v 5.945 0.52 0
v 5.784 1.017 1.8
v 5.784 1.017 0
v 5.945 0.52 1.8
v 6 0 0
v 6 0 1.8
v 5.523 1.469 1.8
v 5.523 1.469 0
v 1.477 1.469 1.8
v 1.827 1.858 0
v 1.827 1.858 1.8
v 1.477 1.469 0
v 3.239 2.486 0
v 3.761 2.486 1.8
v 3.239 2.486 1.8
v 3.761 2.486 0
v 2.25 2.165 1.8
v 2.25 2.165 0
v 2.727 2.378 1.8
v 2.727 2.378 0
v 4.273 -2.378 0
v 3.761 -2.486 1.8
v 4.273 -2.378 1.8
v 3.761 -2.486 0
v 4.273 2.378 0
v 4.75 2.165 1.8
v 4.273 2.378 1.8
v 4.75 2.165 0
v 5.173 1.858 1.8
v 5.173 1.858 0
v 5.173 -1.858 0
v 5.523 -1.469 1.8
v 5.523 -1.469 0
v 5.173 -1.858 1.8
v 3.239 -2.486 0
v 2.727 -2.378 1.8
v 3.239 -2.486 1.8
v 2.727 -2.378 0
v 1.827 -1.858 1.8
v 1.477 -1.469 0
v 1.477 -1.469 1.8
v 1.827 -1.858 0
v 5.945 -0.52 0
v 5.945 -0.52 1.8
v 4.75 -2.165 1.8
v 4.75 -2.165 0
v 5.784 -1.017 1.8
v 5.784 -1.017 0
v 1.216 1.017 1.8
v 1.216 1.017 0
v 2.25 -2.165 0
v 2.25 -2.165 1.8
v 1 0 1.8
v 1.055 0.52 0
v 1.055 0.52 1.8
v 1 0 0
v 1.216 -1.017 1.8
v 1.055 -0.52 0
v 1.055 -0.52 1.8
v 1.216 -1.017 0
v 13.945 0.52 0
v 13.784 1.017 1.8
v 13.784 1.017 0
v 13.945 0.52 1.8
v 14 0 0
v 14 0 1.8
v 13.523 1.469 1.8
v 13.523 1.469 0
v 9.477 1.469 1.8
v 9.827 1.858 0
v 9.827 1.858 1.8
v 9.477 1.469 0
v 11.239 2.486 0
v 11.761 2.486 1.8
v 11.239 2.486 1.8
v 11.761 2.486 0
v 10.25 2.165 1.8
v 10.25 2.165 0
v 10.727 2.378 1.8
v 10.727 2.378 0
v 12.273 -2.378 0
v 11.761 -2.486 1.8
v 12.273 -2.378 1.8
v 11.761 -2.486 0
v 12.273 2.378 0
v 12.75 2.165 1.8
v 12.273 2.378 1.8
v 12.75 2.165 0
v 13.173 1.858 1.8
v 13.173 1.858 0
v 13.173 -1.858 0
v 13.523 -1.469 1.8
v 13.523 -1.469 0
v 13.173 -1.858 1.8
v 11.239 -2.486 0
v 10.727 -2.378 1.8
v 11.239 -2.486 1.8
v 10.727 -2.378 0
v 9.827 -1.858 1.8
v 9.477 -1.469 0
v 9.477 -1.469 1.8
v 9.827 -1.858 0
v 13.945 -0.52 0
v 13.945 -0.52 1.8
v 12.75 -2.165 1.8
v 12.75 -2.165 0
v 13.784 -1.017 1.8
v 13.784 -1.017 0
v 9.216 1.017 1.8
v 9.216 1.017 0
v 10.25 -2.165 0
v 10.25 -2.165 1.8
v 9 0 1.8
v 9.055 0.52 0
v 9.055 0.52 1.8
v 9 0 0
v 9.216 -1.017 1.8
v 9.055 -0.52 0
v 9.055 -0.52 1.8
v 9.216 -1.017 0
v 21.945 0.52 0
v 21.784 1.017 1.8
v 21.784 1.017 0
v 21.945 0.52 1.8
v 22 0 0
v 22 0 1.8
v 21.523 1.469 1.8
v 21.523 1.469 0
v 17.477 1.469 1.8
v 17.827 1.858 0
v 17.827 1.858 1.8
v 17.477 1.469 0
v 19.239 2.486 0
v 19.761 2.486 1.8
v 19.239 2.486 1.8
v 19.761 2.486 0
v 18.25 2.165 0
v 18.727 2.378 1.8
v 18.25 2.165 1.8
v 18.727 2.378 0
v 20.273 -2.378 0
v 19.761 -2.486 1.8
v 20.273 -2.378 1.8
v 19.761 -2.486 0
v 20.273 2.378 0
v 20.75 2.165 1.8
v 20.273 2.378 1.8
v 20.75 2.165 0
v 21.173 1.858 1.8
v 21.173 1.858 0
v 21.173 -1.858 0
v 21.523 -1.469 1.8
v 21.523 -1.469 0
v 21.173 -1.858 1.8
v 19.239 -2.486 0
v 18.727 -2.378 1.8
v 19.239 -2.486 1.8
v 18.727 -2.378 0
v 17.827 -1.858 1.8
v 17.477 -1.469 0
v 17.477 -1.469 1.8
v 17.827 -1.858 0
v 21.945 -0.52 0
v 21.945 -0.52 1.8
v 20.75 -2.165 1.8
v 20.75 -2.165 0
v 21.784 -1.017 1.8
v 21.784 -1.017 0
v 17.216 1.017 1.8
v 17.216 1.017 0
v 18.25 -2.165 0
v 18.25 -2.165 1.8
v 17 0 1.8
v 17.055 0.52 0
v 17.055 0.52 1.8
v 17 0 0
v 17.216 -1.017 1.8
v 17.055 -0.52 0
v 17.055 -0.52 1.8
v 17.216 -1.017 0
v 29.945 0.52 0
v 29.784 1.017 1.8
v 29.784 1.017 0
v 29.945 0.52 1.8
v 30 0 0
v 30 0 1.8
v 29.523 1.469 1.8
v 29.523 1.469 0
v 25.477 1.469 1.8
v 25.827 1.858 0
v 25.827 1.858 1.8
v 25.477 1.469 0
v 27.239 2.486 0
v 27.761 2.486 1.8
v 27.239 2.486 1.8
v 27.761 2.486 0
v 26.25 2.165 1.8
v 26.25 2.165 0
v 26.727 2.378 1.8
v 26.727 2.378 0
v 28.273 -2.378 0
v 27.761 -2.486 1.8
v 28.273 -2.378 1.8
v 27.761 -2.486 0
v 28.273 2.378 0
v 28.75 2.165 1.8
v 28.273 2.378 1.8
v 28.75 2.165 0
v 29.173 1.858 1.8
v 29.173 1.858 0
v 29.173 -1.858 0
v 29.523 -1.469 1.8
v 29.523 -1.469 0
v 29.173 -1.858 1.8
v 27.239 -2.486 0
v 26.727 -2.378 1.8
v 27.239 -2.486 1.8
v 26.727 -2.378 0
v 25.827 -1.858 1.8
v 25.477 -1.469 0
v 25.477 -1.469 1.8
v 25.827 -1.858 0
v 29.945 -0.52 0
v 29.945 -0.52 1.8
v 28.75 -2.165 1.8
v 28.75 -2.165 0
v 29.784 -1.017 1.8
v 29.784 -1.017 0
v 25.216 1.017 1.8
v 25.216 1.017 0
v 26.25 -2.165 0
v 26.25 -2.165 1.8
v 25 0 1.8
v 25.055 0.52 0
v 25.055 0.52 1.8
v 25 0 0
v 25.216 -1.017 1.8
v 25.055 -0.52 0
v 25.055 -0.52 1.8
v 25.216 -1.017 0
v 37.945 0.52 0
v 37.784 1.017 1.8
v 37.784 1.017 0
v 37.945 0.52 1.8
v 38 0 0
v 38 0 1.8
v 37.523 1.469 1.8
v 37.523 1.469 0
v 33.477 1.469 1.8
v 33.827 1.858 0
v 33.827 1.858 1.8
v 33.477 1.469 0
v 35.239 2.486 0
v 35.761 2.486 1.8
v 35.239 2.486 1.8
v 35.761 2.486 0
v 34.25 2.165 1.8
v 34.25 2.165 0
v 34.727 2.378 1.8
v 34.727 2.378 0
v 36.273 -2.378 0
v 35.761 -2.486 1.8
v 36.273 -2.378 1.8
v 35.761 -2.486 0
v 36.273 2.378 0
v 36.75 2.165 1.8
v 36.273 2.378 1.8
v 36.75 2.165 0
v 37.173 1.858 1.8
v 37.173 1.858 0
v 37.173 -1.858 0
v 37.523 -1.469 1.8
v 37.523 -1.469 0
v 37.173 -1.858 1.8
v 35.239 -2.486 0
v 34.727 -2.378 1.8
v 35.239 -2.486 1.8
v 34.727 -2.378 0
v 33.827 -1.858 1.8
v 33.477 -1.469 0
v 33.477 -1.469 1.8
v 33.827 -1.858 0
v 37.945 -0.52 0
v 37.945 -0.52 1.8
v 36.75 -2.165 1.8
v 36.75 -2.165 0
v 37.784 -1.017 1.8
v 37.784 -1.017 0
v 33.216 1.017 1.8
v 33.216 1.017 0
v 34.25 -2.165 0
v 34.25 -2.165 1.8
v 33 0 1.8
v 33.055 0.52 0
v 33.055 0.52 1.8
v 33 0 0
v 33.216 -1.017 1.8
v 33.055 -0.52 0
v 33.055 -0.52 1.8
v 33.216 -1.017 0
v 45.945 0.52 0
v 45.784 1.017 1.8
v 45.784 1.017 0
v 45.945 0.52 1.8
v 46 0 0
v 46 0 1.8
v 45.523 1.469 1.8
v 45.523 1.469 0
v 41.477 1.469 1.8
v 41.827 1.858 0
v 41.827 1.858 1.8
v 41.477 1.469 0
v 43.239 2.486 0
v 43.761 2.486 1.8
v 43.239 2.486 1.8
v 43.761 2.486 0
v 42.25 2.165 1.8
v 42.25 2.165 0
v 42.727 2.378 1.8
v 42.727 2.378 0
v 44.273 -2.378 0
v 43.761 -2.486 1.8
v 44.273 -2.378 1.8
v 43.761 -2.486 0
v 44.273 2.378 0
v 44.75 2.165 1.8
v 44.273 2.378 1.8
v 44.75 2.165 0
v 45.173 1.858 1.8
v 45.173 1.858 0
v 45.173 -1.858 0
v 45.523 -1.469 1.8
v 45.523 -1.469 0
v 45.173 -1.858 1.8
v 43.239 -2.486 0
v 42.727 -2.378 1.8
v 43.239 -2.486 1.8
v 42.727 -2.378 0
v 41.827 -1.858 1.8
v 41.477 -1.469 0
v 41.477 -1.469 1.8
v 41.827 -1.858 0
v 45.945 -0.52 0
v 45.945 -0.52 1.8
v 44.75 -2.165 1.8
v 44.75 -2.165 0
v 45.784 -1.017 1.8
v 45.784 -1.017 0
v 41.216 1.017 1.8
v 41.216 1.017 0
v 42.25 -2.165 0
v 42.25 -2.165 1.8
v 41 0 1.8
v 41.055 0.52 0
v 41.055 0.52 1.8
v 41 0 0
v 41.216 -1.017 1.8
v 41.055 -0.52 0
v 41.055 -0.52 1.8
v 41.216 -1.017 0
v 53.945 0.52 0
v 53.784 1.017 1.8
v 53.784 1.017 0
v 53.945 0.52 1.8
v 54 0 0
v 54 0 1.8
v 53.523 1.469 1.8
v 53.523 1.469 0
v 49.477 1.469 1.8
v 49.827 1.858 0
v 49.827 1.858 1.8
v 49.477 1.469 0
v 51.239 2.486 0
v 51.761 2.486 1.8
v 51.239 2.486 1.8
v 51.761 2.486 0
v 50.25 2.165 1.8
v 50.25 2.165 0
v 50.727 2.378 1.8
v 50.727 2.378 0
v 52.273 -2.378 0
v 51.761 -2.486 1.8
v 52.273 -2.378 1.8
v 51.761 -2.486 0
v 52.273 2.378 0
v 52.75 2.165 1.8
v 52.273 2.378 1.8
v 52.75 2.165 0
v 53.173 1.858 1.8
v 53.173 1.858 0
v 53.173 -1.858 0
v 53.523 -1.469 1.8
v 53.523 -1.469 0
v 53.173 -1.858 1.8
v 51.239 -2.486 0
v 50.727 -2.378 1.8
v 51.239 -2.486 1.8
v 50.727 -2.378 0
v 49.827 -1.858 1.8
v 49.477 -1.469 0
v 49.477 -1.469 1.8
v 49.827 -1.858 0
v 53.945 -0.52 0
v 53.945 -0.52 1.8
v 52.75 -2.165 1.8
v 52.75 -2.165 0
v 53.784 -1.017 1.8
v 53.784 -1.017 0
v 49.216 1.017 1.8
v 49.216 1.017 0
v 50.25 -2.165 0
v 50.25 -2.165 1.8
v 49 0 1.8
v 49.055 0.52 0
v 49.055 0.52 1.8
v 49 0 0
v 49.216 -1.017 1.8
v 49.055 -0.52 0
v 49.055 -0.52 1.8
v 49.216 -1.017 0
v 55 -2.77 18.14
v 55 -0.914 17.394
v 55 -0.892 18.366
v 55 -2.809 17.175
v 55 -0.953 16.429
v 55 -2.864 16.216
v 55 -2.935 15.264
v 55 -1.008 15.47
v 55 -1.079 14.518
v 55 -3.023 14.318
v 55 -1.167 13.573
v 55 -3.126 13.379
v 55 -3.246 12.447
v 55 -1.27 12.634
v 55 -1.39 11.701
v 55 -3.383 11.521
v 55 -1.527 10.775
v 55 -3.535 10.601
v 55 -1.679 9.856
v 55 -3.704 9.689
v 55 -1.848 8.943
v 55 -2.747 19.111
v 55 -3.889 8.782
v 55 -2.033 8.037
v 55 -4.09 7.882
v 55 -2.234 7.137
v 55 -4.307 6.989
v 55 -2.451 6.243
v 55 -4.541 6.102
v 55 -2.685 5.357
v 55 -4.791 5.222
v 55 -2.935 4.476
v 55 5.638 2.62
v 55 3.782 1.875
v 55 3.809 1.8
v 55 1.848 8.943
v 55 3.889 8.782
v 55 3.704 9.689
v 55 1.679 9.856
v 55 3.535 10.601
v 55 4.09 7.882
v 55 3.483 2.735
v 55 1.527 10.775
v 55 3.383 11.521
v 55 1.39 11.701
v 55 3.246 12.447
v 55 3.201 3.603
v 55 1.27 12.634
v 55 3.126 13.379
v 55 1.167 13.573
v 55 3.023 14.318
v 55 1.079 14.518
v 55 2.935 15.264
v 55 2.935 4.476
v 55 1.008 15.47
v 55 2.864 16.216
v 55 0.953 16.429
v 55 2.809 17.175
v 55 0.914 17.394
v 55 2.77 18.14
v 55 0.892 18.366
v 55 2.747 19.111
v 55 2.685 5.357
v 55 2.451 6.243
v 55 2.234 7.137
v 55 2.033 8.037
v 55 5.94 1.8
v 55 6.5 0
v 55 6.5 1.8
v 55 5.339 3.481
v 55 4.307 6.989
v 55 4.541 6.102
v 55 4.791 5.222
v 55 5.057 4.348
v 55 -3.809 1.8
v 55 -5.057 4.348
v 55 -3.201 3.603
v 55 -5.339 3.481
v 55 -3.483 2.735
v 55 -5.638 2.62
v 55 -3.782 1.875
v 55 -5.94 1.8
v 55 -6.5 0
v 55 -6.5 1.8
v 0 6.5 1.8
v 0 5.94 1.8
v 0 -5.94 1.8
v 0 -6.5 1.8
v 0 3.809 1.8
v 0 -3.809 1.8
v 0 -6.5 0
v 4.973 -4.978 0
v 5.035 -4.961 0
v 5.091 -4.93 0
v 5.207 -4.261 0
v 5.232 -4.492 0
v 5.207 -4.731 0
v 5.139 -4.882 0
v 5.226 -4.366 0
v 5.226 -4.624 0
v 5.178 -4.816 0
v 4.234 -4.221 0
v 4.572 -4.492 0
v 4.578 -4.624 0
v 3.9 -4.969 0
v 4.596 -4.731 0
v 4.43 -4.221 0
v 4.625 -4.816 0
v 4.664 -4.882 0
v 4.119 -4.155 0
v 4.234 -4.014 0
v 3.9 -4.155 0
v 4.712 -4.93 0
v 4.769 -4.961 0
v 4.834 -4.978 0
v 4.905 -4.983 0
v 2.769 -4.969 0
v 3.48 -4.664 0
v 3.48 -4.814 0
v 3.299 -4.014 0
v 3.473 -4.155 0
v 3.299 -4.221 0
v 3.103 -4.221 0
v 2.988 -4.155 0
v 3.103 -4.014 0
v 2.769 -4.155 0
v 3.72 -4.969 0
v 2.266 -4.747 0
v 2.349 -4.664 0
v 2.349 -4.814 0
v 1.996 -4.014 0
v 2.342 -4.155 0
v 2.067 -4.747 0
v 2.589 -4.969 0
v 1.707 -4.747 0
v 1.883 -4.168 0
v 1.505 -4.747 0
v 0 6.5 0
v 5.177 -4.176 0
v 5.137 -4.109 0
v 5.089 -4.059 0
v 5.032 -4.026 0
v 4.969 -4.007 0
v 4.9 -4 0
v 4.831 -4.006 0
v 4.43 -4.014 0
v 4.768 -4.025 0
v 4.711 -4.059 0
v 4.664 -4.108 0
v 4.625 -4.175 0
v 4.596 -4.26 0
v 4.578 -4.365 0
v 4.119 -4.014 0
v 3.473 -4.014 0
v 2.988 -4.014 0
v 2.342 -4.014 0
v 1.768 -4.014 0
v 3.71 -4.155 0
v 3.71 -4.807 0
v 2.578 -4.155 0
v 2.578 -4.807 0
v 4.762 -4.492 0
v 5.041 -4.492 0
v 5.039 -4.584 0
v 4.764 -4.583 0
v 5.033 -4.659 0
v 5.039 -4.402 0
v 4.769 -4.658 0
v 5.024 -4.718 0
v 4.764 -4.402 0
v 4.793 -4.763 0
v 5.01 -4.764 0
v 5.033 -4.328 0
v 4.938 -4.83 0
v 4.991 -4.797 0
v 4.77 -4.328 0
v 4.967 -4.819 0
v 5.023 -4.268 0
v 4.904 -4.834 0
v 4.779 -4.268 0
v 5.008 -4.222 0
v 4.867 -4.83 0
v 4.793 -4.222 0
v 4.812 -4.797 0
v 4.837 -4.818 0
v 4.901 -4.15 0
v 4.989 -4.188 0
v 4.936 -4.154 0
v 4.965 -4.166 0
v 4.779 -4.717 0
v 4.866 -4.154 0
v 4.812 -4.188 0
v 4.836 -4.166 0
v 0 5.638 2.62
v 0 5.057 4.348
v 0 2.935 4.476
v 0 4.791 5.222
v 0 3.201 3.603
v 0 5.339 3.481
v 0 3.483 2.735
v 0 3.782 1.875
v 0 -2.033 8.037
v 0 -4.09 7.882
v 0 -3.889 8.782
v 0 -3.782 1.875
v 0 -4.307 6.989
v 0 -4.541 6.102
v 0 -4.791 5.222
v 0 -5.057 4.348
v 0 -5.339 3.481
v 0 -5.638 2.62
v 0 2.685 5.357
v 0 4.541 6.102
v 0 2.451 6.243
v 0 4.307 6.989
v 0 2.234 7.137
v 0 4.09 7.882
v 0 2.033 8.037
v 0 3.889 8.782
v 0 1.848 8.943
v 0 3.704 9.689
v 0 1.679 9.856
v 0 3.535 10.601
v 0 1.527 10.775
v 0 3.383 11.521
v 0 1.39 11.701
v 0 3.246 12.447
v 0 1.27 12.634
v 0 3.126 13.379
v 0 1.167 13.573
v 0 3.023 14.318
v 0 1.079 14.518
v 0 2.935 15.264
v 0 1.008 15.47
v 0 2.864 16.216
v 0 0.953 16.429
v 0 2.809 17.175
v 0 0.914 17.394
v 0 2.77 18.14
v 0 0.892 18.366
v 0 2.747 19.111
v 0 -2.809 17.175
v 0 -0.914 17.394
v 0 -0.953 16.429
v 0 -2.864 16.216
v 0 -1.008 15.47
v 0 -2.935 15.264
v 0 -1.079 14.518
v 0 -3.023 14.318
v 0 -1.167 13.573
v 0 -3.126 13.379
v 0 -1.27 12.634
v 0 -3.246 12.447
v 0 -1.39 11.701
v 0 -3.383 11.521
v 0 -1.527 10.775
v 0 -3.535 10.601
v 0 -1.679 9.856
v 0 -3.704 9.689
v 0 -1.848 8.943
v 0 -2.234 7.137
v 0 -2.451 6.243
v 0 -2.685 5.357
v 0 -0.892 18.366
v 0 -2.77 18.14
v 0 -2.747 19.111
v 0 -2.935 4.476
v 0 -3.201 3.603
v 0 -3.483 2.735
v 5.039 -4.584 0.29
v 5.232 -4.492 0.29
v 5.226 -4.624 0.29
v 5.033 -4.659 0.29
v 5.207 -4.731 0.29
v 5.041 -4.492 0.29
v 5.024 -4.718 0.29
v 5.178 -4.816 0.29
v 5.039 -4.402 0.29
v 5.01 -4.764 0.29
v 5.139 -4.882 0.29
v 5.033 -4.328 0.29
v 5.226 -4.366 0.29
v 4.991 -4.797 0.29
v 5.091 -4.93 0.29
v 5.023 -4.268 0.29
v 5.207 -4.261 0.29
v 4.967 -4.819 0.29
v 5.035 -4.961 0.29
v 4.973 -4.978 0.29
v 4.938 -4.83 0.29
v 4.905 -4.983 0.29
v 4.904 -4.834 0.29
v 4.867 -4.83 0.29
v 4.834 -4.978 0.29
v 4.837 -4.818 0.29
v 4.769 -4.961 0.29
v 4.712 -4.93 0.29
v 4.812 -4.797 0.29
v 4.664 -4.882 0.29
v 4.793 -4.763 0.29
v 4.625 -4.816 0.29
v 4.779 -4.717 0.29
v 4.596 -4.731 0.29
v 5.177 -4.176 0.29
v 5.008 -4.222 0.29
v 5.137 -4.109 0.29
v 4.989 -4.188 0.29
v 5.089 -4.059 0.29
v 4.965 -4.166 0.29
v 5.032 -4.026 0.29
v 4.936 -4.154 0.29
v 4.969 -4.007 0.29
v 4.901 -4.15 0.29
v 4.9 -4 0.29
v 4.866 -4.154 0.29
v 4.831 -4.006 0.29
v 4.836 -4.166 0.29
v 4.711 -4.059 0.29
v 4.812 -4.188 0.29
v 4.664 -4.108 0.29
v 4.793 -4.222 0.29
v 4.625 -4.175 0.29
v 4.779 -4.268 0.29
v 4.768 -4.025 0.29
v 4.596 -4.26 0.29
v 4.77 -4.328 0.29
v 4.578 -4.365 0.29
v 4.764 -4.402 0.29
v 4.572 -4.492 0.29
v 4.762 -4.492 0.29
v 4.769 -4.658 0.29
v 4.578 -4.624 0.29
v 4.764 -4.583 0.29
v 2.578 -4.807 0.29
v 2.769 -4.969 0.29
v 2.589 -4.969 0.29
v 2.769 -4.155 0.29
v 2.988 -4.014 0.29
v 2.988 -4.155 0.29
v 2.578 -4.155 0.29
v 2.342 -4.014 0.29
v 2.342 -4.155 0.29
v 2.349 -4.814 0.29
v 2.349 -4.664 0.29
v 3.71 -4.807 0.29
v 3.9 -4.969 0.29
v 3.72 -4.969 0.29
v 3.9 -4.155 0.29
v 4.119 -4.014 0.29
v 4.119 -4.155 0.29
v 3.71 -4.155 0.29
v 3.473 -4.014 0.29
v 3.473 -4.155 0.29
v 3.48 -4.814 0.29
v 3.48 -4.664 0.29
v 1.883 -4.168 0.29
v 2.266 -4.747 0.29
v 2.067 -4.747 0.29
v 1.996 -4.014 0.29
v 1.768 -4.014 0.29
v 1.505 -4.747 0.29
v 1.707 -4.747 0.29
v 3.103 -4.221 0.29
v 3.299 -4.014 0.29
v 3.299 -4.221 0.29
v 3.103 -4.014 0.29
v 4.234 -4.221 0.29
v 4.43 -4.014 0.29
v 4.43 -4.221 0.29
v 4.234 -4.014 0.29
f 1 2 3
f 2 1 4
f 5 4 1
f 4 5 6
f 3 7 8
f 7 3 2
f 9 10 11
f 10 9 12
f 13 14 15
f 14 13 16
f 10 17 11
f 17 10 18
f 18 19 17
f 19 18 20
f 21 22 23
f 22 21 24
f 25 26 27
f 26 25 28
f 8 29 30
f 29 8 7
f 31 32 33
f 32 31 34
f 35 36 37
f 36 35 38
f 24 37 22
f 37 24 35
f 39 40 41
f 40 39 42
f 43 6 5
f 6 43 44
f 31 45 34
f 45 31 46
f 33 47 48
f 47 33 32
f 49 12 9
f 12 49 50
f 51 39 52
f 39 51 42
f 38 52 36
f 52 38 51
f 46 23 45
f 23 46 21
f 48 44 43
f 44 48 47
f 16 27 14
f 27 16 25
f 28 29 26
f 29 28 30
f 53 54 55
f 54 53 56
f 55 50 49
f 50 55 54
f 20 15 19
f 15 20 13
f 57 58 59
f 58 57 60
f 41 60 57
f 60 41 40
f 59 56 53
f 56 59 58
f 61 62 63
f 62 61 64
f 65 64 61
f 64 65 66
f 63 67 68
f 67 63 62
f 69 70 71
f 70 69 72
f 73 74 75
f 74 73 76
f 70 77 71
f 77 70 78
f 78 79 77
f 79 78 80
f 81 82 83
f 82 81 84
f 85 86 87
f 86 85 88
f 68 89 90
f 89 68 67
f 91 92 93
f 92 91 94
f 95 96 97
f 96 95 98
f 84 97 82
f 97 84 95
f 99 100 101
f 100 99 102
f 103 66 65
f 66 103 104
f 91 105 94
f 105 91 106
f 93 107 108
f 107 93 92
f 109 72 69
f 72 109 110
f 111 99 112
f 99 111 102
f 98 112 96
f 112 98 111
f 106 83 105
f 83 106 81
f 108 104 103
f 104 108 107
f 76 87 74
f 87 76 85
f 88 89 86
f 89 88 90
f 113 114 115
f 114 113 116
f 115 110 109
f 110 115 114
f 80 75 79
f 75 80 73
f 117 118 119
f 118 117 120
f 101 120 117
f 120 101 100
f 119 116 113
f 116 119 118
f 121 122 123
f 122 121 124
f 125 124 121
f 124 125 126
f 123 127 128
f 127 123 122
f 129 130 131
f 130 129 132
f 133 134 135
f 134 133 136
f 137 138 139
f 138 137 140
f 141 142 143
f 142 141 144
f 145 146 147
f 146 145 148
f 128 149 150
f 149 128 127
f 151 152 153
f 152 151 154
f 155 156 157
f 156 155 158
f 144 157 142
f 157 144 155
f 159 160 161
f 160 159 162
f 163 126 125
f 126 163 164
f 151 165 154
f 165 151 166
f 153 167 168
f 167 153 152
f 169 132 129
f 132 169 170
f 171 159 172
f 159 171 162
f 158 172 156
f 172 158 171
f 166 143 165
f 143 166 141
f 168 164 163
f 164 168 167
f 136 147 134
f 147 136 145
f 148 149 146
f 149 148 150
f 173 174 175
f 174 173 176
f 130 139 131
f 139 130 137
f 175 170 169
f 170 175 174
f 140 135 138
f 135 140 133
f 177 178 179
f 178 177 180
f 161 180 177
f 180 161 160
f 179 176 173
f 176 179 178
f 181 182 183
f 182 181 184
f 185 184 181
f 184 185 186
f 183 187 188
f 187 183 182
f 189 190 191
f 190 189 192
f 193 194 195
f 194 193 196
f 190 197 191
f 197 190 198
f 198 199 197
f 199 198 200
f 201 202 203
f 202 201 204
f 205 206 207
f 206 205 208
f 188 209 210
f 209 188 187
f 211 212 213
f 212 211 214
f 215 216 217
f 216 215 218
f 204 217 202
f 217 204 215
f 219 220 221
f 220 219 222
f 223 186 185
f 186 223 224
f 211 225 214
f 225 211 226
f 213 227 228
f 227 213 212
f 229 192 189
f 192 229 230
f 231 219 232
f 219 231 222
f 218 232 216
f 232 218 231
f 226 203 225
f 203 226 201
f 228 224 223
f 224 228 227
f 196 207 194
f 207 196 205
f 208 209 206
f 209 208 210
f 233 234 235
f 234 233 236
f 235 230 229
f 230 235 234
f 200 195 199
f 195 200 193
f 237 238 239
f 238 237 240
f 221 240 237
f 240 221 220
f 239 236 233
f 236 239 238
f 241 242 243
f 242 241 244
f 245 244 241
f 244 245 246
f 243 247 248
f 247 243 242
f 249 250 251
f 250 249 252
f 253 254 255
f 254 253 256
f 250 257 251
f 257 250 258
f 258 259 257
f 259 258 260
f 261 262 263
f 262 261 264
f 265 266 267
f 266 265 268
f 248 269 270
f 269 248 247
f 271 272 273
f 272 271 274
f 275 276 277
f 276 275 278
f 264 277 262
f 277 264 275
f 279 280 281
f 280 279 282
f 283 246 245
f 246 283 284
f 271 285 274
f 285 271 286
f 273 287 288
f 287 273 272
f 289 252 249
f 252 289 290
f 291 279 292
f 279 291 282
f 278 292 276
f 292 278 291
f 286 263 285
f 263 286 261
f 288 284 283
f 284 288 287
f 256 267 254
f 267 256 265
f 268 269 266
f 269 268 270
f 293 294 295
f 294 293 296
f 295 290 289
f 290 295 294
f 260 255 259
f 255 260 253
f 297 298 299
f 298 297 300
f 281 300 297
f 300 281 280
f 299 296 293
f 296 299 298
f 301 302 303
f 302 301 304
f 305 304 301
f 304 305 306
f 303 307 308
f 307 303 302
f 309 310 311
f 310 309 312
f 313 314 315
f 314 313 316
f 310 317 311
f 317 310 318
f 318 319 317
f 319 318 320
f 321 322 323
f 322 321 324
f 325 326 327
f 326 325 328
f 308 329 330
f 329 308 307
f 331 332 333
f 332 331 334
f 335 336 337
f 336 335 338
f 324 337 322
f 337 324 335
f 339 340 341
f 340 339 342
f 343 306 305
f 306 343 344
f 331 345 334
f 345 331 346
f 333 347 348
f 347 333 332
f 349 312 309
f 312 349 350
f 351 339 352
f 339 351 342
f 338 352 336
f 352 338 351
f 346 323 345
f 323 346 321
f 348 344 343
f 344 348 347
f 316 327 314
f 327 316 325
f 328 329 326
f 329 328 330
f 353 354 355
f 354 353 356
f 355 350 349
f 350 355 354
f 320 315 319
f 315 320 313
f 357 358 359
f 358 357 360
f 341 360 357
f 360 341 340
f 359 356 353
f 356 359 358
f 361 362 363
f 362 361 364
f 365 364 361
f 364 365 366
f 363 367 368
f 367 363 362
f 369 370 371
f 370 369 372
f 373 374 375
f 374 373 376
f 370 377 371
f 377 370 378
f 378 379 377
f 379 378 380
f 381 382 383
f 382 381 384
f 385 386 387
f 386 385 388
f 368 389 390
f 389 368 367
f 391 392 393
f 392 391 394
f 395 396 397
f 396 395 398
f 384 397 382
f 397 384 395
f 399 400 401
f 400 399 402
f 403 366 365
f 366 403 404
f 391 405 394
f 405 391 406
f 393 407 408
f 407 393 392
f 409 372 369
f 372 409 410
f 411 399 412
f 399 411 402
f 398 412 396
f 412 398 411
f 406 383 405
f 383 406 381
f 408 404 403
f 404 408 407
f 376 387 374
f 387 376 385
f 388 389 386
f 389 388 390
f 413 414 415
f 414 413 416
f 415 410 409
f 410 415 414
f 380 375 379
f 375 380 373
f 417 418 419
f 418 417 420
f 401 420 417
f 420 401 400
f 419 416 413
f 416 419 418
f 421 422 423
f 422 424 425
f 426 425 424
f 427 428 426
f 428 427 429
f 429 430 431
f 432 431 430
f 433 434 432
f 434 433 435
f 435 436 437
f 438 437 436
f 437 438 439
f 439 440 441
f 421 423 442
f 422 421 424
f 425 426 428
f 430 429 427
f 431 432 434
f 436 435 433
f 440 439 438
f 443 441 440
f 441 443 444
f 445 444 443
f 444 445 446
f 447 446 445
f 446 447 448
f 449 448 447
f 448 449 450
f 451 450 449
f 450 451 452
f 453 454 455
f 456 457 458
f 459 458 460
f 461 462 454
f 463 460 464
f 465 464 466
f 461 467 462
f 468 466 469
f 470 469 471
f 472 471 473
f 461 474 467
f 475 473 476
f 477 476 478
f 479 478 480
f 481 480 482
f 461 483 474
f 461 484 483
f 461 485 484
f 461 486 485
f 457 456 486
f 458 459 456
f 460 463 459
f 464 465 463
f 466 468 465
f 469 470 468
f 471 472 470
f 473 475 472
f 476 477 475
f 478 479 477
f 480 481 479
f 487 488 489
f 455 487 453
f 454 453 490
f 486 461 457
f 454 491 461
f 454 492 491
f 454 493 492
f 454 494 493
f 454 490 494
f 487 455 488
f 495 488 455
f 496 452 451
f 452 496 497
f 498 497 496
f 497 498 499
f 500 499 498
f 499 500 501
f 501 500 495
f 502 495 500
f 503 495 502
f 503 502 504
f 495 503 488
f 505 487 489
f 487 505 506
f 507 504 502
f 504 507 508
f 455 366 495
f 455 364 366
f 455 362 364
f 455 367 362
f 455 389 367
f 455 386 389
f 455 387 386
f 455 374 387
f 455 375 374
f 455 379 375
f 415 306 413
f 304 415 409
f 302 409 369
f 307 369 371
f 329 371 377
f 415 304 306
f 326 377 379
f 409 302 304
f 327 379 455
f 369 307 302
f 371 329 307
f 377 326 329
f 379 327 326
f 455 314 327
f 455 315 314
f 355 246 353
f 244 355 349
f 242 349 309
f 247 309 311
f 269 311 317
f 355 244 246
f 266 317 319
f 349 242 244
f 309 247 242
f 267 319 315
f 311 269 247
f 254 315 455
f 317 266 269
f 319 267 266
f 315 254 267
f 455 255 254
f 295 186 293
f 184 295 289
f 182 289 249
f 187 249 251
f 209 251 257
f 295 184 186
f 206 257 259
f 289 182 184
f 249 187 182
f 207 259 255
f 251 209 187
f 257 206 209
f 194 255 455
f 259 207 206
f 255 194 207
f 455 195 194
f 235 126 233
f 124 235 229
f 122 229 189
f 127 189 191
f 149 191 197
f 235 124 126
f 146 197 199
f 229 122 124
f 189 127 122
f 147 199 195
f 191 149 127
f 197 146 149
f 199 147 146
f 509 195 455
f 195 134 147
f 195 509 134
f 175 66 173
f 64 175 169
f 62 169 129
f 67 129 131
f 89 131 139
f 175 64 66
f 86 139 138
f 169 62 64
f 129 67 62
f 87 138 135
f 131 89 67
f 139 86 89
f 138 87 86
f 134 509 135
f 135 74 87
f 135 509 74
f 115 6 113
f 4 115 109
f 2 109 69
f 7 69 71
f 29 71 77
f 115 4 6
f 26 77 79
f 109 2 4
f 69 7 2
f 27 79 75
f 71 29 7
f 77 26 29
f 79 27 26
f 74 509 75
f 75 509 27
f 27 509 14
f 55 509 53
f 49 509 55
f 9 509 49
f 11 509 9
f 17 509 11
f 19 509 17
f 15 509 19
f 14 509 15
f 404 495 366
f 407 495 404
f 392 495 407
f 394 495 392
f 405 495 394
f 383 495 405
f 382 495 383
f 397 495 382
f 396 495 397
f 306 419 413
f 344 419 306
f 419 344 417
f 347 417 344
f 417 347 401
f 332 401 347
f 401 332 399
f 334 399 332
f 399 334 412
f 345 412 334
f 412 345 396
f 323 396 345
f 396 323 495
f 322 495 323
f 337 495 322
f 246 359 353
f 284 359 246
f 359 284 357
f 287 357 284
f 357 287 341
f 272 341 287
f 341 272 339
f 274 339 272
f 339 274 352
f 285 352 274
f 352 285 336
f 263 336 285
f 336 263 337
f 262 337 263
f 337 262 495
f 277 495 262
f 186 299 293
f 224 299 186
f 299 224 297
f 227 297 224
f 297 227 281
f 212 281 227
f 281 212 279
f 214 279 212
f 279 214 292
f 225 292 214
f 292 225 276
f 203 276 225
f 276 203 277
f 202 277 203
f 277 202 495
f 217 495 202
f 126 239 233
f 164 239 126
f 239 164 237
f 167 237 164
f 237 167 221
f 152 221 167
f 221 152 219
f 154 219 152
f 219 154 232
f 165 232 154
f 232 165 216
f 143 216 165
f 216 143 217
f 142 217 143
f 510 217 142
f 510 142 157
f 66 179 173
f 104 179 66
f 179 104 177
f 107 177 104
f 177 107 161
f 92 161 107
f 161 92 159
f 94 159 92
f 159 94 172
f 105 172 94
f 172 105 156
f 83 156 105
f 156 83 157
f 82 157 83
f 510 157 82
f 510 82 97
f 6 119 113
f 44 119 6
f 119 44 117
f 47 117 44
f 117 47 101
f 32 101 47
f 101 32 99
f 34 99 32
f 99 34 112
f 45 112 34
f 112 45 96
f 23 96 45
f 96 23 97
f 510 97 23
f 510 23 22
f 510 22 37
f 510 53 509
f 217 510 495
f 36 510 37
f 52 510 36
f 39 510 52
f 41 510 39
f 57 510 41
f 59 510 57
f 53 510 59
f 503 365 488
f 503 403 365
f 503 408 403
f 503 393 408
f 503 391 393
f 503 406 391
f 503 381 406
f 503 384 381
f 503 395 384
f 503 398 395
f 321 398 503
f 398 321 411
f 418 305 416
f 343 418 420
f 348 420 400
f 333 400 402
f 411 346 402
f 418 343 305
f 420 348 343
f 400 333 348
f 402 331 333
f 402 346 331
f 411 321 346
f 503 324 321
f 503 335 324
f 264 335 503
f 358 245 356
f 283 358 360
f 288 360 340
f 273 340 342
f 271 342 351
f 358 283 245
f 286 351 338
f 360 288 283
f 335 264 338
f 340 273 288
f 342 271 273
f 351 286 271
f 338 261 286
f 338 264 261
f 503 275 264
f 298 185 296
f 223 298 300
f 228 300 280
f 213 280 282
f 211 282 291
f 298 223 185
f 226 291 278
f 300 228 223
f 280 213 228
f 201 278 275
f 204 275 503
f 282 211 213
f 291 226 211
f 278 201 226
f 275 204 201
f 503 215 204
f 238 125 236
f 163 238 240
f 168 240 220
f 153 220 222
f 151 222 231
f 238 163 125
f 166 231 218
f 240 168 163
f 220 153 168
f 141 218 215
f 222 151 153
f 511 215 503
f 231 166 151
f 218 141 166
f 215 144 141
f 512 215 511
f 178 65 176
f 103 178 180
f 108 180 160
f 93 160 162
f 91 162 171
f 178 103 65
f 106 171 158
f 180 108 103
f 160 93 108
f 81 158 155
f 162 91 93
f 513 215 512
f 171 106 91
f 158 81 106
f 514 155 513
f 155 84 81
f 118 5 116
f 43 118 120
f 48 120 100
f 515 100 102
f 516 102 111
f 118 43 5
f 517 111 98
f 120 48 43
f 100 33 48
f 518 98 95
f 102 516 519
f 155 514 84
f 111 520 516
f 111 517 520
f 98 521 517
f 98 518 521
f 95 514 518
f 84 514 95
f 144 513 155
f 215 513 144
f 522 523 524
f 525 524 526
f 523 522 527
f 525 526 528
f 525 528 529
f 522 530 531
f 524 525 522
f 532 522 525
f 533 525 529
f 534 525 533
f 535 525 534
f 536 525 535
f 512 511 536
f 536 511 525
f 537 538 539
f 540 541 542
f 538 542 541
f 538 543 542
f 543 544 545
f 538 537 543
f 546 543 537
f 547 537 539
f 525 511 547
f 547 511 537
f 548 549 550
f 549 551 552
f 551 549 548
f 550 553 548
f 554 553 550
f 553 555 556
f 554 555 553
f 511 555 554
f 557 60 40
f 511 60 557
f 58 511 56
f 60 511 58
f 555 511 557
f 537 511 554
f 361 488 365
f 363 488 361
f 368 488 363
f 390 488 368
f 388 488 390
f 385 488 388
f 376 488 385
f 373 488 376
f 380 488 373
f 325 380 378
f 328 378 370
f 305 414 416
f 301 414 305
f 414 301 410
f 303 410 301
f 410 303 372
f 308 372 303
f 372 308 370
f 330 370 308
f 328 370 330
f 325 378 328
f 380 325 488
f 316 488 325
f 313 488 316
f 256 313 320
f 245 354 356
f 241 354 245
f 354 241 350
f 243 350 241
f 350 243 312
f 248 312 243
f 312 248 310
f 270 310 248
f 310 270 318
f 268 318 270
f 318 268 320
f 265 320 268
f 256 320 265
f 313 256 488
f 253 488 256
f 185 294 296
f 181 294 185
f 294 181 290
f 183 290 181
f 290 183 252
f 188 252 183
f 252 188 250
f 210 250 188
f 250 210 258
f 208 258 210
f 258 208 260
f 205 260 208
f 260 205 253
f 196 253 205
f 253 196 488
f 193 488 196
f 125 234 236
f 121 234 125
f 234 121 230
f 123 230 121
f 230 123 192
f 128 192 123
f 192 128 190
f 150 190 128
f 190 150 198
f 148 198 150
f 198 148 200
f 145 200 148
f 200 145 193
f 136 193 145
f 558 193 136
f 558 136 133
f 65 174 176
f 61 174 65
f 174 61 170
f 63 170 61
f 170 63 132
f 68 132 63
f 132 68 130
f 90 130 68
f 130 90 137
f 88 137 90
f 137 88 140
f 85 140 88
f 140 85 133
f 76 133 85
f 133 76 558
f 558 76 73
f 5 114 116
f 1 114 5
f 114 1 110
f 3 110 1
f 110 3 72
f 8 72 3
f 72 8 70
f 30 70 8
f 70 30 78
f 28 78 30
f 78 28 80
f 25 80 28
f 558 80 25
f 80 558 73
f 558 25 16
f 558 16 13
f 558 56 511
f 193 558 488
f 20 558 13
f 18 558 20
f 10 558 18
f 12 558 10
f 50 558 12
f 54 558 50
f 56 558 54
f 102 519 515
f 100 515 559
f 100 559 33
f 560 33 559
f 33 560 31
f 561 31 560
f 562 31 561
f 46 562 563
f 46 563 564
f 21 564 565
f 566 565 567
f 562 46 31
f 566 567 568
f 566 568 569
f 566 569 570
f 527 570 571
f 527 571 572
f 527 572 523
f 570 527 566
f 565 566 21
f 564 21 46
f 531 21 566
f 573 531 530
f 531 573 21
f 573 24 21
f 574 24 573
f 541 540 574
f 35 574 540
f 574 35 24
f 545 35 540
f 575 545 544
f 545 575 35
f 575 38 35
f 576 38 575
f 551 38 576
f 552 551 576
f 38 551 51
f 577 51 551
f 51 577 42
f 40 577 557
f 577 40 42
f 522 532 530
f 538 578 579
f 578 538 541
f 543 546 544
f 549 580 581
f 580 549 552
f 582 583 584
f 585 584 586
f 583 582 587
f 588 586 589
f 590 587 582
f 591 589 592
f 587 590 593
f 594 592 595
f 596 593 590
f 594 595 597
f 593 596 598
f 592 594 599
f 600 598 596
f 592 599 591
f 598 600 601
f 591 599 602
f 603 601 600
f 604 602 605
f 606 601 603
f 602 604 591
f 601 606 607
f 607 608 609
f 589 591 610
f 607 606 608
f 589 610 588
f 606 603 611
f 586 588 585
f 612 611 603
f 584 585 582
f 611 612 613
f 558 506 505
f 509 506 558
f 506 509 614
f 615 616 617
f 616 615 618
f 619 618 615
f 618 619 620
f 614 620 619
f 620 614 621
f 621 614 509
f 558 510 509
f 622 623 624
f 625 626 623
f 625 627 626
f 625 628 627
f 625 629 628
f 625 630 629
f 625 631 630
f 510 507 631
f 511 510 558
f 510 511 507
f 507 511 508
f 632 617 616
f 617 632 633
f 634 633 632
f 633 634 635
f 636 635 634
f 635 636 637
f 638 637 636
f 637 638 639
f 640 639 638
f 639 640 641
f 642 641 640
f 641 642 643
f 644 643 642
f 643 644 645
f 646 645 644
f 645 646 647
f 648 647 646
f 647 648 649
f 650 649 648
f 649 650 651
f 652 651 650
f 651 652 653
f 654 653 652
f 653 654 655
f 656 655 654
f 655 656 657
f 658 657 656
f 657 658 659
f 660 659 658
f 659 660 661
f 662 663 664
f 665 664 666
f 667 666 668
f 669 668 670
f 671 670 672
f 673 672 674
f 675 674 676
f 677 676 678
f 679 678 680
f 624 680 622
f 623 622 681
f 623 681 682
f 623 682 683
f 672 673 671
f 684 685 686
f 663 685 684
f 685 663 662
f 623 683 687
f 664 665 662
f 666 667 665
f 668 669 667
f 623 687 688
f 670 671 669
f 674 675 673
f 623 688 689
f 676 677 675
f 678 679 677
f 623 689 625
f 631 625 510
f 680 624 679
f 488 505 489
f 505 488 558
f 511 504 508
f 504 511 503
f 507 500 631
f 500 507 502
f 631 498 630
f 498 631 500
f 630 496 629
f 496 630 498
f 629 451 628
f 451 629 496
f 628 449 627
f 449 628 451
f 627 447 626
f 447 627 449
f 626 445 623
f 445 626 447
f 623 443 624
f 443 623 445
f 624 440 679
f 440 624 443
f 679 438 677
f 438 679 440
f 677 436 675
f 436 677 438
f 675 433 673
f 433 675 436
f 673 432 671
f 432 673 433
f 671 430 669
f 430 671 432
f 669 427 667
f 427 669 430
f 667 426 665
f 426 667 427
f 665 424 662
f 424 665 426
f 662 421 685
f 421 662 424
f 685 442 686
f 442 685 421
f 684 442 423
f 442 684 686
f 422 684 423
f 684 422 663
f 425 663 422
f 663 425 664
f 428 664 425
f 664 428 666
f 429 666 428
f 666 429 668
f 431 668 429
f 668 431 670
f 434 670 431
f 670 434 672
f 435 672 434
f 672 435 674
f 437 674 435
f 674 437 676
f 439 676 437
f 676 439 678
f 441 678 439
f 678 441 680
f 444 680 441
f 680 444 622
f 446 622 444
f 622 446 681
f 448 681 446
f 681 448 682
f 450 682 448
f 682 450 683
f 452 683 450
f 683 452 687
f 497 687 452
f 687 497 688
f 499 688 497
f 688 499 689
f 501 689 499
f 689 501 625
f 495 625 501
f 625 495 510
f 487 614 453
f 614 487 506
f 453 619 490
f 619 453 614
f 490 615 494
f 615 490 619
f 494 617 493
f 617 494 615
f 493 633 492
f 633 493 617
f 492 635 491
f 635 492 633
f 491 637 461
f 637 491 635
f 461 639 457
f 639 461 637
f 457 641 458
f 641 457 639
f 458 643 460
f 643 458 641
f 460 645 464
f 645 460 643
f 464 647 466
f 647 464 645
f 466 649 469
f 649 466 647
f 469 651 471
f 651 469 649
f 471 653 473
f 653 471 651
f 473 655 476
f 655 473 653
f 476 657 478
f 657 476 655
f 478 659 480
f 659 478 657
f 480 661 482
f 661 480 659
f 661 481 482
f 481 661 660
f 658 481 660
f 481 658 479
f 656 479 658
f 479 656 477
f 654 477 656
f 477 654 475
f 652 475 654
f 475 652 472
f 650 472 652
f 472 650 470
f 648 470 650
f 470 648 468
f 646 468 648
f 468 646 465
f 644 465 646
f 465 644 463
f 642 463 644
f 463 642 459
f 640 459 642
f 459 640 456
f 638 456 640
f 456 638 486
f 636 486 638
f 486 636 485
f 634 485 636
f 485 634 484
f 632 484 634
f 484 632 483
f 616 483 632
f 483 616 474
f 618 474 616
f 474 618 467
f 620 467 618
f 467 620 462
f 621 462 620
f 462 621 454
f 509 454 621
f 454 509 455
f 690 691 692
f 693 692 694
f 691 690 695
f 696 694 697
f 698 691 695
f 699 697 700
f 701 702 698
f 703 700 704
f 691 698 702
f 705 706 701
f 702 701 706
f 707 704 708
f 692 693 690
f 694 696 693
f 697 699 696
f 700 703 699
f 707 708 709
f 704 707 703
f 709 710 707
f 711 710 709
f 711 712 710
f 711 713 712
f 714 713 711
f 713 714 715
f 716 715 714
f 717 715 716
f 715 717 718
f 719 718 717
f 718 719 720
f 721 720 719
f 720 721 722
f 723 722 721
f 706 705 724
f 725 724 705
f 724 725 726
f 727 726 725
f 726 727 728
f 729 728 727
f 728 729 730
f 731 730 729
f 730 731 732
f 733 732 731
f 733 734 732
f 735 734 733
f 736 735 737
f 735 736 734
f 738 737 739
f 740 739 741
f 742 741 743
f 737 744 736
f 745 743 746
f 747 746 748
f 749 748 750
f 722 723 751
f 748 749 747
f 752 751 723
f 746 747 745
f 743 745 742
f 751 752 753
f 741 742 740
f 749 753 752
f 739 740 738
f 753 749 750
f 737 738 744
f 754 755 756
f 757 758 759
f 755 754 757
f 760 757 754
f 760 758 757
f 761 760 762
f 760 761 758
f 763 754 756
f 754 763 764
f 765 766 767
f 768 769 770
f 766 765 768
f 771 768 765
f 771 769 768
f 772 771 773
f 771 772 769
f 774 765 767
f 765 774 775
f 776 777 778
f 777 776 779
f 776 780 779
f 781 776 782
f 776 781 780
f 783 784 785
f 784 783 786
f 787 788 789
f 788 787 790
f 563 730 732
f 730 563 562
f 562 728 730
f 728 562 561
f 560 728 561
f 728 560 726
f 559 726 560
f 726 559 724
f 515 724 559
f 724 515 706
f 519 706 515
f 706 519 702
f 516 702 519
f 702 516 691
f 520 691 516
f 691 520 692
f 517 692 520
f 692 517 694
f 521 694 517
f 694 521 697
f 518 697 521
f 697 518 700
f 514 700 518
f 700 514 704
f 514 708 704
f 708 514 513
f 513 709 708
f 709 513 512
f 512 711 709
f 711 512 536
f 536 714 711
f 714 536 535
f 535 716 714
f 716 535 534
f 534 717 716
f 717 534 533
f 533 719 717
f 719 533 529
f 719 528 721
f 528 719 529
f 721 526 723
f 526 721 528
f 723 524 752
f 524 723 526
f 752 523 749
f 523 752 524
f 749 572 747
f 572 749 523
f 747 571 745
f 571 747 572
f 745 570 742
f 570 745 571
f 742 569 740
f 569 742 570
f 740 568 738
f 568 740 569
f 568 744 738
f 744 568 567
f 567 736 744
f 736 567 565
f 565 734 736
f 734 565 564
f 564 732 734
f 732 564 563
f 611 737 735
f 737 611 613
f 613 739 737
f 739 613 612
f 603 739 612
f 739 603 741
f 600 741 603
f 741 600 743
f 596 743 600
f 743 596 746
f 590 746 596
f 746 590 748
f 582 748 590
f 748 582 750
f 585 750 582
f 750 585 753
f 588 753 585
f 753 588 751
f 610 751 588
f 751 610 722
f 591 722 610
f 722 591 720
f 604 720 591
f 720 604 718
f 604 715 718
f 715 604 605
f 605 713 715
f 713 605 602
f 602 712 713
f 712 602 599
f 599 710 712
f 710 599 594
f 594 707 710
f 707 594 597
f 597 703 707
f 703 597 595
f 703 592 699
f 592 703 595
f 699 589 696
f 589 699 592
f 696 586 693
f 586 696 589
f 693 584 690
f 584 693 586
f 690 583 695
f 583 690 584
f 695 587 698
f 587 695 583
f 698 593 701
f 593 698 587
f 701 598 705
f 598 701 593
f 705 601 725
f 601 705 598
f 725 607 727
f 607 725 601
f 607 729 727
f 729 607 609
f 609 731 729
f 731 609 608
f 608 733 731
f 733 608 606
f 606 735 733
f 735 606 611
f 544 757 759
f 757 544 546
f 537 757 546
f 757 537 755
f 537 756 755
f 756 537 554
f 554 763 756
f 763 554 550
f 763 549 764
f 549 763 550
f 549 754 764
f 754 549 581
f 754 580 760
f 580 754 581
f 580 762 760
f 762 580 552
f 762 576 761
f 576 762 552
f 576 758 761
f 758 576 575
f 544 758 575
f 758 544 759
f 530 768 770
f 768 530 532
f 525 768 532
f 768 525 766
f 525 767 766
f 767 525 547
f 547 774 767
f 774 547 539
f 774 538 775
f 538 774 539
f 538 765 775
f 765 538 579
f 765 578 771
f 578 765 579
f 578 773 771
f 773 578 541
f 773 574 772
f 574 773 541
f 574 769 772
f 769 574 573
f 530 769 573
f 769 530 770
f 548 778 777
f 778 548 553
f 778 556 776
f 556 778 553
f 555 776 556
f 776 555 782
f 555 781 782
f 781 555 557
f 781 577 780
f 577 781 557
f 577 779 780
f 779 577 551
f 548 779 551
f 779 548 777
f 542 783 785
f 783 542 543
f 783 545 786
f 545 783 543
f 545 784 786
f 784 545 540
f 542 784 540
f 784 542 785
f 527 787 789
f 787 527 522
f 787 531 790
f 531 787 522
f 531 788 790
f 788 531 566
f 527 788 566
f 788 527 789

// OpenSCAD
// file: common.scad
CENTER_SIZE = 9;
SLEEVE_LENGTH = 55;
SLEEVE_REACH = SLEEVE_LENGTH + CENTER_SIZE/2;
GROOVE_WIDTH = 9;
WALL_HEIGHT = 10;
WALL_THICKNESS = 2;
BASE_THICKNESS = 2;
TOTAL_WIDTH = GROOVE_WIDTH + 2 * WALL_THICKNESS;
DOWEL_DIAMETER = 4.5;
DOWEL_DEPTH = 3;
CARDBOARD_THICKNESS = 2;
GROOVE_BOTTOM = CARDBOARD_THICKNESS;
CURVE_POWER = 2;
CURVE_POINTS = 20;
TILT_ANGLE_EXTRA = 5;
FLEXIBLE_WALL_HEIGHT = WALL_HEIGHT * 2;

LEFT = 3;
RIGHT = 1;

function wall_curve(z, wall_height) =
    GROOVE_BOTTOM/2 + (GROOVE_WIDTH/2 - GROOVE_BOTTOM/2) * pow(z/wall_height, CURVE_POWER);

module curved_wall_profile(side, wall_height) {
    points_inner = [for (i = [0:CURVE_POINTS])
        [wall_curve(i * wall_height / CURVE_POINTS, wall_height) * side,
         i * wall_height / CURVE_POINTS]
    ];
    points_outer = [for (i = [0:CURVE_POINTS])
        [(wall_curve(i * wall_height / CURVE_POINTS, wall_height) + WALL_THICKNESS) * side,
         i * wall_height / CURVE_POINTS]
    ];
    all_points = concat(
        [[points_inner[0][0], 0]],
        points_inner,
        [points_outer[len(points_outer)-1]],
        [for (i = [len(points_outer)-1:-1:0]) points_outer[i]],
        [[points_outer[0][0], 0]]
    );
    polygon(all_points);
}

module draw_regular_wall_base(width, z_offset = BASE_THICKNESS) {
    translate([0, 0, z_offset])
        cube([width, WALL_THICKNESS, WALL_HEIGHT]);
}

module draw_flexible_wall_base(width, z_offset = BASE_THICKNESS) {
    wall_height = FLEXIBLE_WALL_HEIGHT - z_offset;
    tilt_angle = atan((GROOVE_WIDTH/2 - GROOVE_BOTTOM/2) / wall_height) + TILT_ANGLE_EXTRA;
    translate([0, -WALL_THICKNESS/2, z_offset - 2])
        rotate([tilt_angle + 6, 0, 0])
            rotate([90, 0, 90])
                linear_extrude(height = width)
                    curved_wall_profile(1, wall_height);
}

module draw_center_base(with_dowel = false) {
    union() {
        translate([-TOTAL_WIDTH/2, -TOTAL_WIDTH/2, 0])
            cube([TOTAL_WIDTH, TOTAL_WIDTH, BASE_THICKNESS]);
        if (with_dowel) {
            translate([0, 0, -DOWEL_DEPTH])
                cylinder(h=DOWEL_DEPTH, d=DOWEL_DIAMETER, $fn=30);
        }
    }
}

module orient_wall(side) {
    if (side == 0) {
        rotate([0, 0, 270])
            children();
    } else if (side == 1) {
        children();
    } else if (side == 2) {
        rotate([0, 0, 90])
            children();
    } else if (side == 3) {
        rotate([0, 0, 180])
            children();
    }
}

module translate_center_wall(side) {
    if (side == 0) {
        translate([CENTER_SIZE/2, TOTAL_WIDTH/2, 0])
            children();
    } else if (side == 1) {
        translate([-TOTAL_WIDTH/2, CENTER_SIZE/2, 0])
            children();
    } else if (side == 2) {
        translate([-CENTER_SIZE/2, -TOTAL_WIDTH/2, 0])
            children();
    } else if (side == 3) {
        translate([TOTAL_WIDTH/2, -CENTER_SIZE/2, 0])
            children();
    }
}

module position_center_wall(side) {
    translate_center_wall(side) {
        orient_wall(side) {
            children();
        }
    }
}

module place_center_wall(side, wall_type = "regular", z_offset = BASE_THICKNESS) {
    position_center_wall(side) {
        if (wall_type == "regular") {
            draw_regular_wall_base(TOTAL_WIDTH, z_offset);
        } else {
            draw_flexible_wall_base(TOTAL_WIDTH, z_offset);
        }
    }
}

module draw_sleeve_base(with_dowel = false) {
    union() {
        translate([0, -TOTAL_WIDTH/2, 0])
            cube([SLEEVE_LENGTH, TOTAL_WIDTH, BASE_THICKNESS]);
        if (with_dowel) {
            translate([25 - CENTER_SIZE/2, 0, -DOWEL_DEPTH])
                cylinder(h=DOWEL_DEPTH, d=DOWEL_DIAMETER, $fn=30);
            translate([50 - CENTER_SIZE/2, 0, -DOWEL_DEPTH])
                cylinder(h=DOWEL_DEPTH, d=DOWEL_DIAMETER, $fn=30);
        }
    }
}

module translate_sleeve_wall(side) {
    if (side == LEFT) {
        translate([SLEEVE_LENGTH, -TOTAL_WIDTH/2 + WALL_THICKNESS, 0])
            children();
    } else if (side == RIGHT) {
        translate([0, TOTAL_WIDTH/2 - WALL_THICKNESS, 0])
            children();
    }
}

module position_sleeve_wall(side) {
    translate_sleeve_wall(side) {
        orient_wall(side) {
            children();
        }
    }
}

module draw_sleeve_wall(side, wall_type = "regular", z_offset = BASE_THICKNESS) {
    position_sleeve_wall(side) {
        if (wall_type == "regular") {
            draw_regular_wall_base(SLEEVE_LENGTH, z_offset);
        } else {
            draw_flexible_wall_base(SLEEVE_LENGTH, z_offset);
        }
    }
}

module draw_full_sleeve(with_dowel = false, wall_type = "regular", z_offset = BASE_THICKNESS) {
    union() {
        draw_sleeve_base(with_dowel);
        draw_sleeve_wall(LEFT, wall_type, z_offset);
        draw_sleeve_wall(RIGHT, wall_type, z_offset);
    }
}

module place_sleeve(side, with_dowel = false, wall_type = "regular", z_offset = BASE_THICKNESS) {
    if (side == 0) {
        translate([CENTER_SIZE/2, 0, 0])
            draw_full_sleeve(with_dowel, wall_type, z_offset);
    } else if (side == 1) {
        rotate([0, 0, 90])
            translate([CENTER_SIZE/2, 0, 0])
                draw_full_sleeve(with_dowel, wall_type, z_offset);
    } else if (side == 2) {
        rotate([0, 0, 180])
            translate([CENTER_SIZE/2, 0, 0])
                draw_full_sleeve(with_dowel, wall_type, z_offset);
    } else if (side == 3) {
        rotate([0, 0, 270])
            translate([CENTER_SIZE/2, 0, 0])
                draw_full_sleeve(with_dowel, wall_type, z_offset);
    }
}

module add_dowel(x, y, dowel_diameter, dowel_depth) {
    translate([x, y, -dowel_depth])
        cylinder(h=dowel_depth, d=dowel_diameter, $fn=30);
}
// file: version.scad
VERSION = "v1.1.0";

module engrave_version_text(text, size=1.0, depth=0.3) {
    linear_extrude(height=depth)
        text(text, size=size, font="Liberation Sans:style=Bold", halign="left", valign="bottom");
}

module print_version_at(x, y, z) {
    translate([x, y, z])
        rotate([180, 0, 0])
            translate([0, 0, -0.29])
                engrave_version_text(VERSION);
}

module print_version(x=-5, y=-4, z=0) {
    print_version_at(x, y, z);
}

module print_version_sleeve(x=1.5, y=-4, z=0) {
    print_version_at(x, y, z);
}
// file: lego.scad
include <common.scad>

LEGO_STUD_DIAMETER = 4.8;
LEGO_STUD_HEIGHT = 1.8;
LEGO_UNIT = 8;
LEGO_HOLE_DIAMETER = 5.0;
LEGO_NICHE_DEPTH = 2.2;
LEGO_NICHE_ROOF = 1.0;
LEGO_NICHE_BASE_THICKNESS = LEGO_NICHE_DEPTH + LEGO_NICHE_ROOF;
LEGO_INTER_CYLINDER_DIAMETER = LEGO_UNIT - LEGO_STUD_DIAMETER - 0.2;
LEGO_INTER_CYLINDER_HOLE_DIAMETER = 1.5;
LEGO_NICHE_WIDTH = LEGO_HOLE_DIAMETER;

module draw_lego_stud() {
    cylinder(h=LEGO_STUD_HEIGHT, d=LEGO_STUD_DIAMETER, $fn=30);
}

module draw_lego_hole() {
    cylinder(h=LEGO_STUD_HEIGHT + 0.1, d=LEGO_HOLE_DIAMETER, $fn=30);
}

module draw_center_with_studs(with_dowel = false) {
    union() {
        draw_center_base(with_dowel);
        translate([0, 0, BASE_THICKNESS])
            draw_lego_stud();
    }
}

module draw_sleeve_with_studs(with_dowel = false) {
    first_stud_candidate = LEGO_UNIT - (CENTER_SIZE/2 % LEGO_UNIT);
    first_stud = first_stud_candidate < LEGO_STUD_DIAMETER/2
                 ? first_stud_candidate + LEGO_UNIT
                 : first_stud_candidate;

    max_stud_position = SLEEVE_LENGTH - LEGO_STUD_DIAMETER/2;
    num_studs = floor((max_stud_position - first_stud) / LEGO_UNIT) + 1;

    union() {
        draw_sleeve_base(with_dowel);
        for (i = [0:num_studs-1]) {
            translate([first_stud + i * LEGO_UNIT, 0, BASE_THICKNESS])
                draw_lego_stud();
        }
    }
}

module place_sleeve_with_studs(side, with_dowel = false) {
    if (side == 0) {
        translate([CENTER_SIZE/2, 0, 0])
            draw_sleeve_with_studs(with_dowel);
    } else if (side == 1) {
        rotate([0, 0, 90])
            translate([CENTER_SIZE/2, 0, 0])
                draw_sleeve_with_studs(with_dowel);
    } else if (side == 2) {
        rotate([0, 0, 180])
            translate([CENTER_SIZE/2, 0, 0])
                draw_sleeve_with_studs(with_dowel);
    } else if (side == 3) {
        rotate([0, 0, 270])
            translate([CENTER_SIZE/2, 0, 0])
                draw_sleeve_with_studs(with_dowel);
    }
}

module draw_sleeve_base_with_simple_holes() {
    first_stud_candidate = LEGO_UNIT - (CENTER_SIZE/2 % LEGO_UNIT);
    first_stud = first_stud_candidate < LEGO_STUD_DIAMETER/2
                 ? first_stud_candidate + LEGO_UNIT
                 : first_stud_candidate;

    max_stud_position = SLEEVE_LENGTH - LEGO_STUD_DIAMETER/2;
    num_studs = floor((max_stud_position - first_stud) / LEGO_UNIT) + 1;

    difference() {
        translate([0, -TOTAL_WIDTH/2, 0])
            cube([SLEEVE_LENGTH, TOTAL_WIDTH, LEGO_STUD_HEIGHT]);

        for (i = [0:num_studs-1]) {
            translate([first_stud + i * LEGO_UNIT, 0, -0.05])
                draw_lego_hole();
        }
    }
}


module draw_sleeve_base_with_niche() {
    first_stud_candidate = LEGO_UNIT - (CENTER_SIZE/2 % LEGO_UNIT);
    first_stud = first_stud_candidate < LEGO_STUD_DIAMETER/2
                 ? first_stud_candidate + LEGO_UNIT
                 : first_stud_candidate;

    max_stud_position = SLEEVE_LENGTH - LEGO_STUD_DIAMETER/2;
    num_studs = floor((max_stud_position - first_stud) / LEGO_UNIT) + 1;

    niche_x_start = first_stud - LEGO_STUD_DIAMETER/2;
    niche_x_end = first_stud + (num_studs - 1) * LEGO_UNIT + LEGO_STUD_DIAMETER/2;
    niche_length = niche_x_end - niche_x_start;

    union() {
        difference() {
            translate([0, -TOTAL_WIDTH/2, 0])
                cube([SLEEVE_LENGTH, TOTAL_WIDTH, LEGO_NICHE_BASE_THICKNESS]);

            translate([niche_x_start, -LEGO_NICHE_WIDTH/2, 0])
                cube([niche_length, LEGO_NICHE_WIDTH, LEGO_NICHE_DEPTH + 0.1]);

            for (i = [0:num_studs-1]) {
                translate([first_stud + i * LEGO_UNIT, 0, -0.05])
                    cylinder(h=LEGO_NICHE_DEPTH + 0.1, d=LEGO_HOLE_DIAMETER, $fn=30);
            }
        }

        for (i = [0:num_studs-2]) {
            translate([first_stud + i * LEGO_UNIT + LEGO_UNIT/2, 0, LEGO_NICHE_DEPTH / 3])
                difference() {
                    cylinder(h=LEGO_NICHE_DEPTH * 2/3, d=LEGO_INTER_CYLINDER_DIAMETER, $fn=30);
                    translate([0, 0, -0.05])
                        cylinder(h=LEGO_NICHE_DEPTH * 2/3 + 0.1, d=LEGO_INTER_CYLINDER_HOLE_DIAMETER, $fn=30);
                }
        }
    }
}

module draw_sleeve_with_simple_holes() {
    union() {
        draw_sleeve_base_with_simple_holes();
        draw_sleeve_wall(LEFT, "regular", LEGO_STUD_HEIGHT);
        draw_sleeve_wall(RIGHT, "regular", LEGO_STUD_HEIGHT);
    }
}

module draw_sleeve_with_simple_holes_flexible() {
    union() {
        draw_sleeve_base_with_simple_holes();
        draw_sleeve_wall(LEFT, "flexible", LEGO_STUD_HEIGHT);
        draw_sleeve_wall(RIGHT, "flexible", LEGO_STUD_HEIGHT);
    }
}


module draw_sleeve_with_niche() {
    union() {
        draw_sleeve_base_with_niche();
        draw_sleeve_wall(LEFT, "regular", LEGO_NICHE_BASE_THICKNESS);
        draw_sleeve_wall(RIGHT, "regular", LEGO_NICHE_BASE_THICKNESS);
    }
}

module draw_sleeve_with_niche_flexible() {
    union() {
        draw_sleeve_base_with_niche();
        draw_sleeve_wall(LEFT, "flexible", LEGO_NICHE_BASE_THICKNESS);
        draw_sleeve_wall(RIGHT, "flexible", LEGO_NICHE_BASE_THICKNESS);
    }
}
// main file
use <lego.scad>
use <version.scad>

difference() {
    draw_sleeve_with_simple_holes_flexible();
    print_version_sleeve();
}
